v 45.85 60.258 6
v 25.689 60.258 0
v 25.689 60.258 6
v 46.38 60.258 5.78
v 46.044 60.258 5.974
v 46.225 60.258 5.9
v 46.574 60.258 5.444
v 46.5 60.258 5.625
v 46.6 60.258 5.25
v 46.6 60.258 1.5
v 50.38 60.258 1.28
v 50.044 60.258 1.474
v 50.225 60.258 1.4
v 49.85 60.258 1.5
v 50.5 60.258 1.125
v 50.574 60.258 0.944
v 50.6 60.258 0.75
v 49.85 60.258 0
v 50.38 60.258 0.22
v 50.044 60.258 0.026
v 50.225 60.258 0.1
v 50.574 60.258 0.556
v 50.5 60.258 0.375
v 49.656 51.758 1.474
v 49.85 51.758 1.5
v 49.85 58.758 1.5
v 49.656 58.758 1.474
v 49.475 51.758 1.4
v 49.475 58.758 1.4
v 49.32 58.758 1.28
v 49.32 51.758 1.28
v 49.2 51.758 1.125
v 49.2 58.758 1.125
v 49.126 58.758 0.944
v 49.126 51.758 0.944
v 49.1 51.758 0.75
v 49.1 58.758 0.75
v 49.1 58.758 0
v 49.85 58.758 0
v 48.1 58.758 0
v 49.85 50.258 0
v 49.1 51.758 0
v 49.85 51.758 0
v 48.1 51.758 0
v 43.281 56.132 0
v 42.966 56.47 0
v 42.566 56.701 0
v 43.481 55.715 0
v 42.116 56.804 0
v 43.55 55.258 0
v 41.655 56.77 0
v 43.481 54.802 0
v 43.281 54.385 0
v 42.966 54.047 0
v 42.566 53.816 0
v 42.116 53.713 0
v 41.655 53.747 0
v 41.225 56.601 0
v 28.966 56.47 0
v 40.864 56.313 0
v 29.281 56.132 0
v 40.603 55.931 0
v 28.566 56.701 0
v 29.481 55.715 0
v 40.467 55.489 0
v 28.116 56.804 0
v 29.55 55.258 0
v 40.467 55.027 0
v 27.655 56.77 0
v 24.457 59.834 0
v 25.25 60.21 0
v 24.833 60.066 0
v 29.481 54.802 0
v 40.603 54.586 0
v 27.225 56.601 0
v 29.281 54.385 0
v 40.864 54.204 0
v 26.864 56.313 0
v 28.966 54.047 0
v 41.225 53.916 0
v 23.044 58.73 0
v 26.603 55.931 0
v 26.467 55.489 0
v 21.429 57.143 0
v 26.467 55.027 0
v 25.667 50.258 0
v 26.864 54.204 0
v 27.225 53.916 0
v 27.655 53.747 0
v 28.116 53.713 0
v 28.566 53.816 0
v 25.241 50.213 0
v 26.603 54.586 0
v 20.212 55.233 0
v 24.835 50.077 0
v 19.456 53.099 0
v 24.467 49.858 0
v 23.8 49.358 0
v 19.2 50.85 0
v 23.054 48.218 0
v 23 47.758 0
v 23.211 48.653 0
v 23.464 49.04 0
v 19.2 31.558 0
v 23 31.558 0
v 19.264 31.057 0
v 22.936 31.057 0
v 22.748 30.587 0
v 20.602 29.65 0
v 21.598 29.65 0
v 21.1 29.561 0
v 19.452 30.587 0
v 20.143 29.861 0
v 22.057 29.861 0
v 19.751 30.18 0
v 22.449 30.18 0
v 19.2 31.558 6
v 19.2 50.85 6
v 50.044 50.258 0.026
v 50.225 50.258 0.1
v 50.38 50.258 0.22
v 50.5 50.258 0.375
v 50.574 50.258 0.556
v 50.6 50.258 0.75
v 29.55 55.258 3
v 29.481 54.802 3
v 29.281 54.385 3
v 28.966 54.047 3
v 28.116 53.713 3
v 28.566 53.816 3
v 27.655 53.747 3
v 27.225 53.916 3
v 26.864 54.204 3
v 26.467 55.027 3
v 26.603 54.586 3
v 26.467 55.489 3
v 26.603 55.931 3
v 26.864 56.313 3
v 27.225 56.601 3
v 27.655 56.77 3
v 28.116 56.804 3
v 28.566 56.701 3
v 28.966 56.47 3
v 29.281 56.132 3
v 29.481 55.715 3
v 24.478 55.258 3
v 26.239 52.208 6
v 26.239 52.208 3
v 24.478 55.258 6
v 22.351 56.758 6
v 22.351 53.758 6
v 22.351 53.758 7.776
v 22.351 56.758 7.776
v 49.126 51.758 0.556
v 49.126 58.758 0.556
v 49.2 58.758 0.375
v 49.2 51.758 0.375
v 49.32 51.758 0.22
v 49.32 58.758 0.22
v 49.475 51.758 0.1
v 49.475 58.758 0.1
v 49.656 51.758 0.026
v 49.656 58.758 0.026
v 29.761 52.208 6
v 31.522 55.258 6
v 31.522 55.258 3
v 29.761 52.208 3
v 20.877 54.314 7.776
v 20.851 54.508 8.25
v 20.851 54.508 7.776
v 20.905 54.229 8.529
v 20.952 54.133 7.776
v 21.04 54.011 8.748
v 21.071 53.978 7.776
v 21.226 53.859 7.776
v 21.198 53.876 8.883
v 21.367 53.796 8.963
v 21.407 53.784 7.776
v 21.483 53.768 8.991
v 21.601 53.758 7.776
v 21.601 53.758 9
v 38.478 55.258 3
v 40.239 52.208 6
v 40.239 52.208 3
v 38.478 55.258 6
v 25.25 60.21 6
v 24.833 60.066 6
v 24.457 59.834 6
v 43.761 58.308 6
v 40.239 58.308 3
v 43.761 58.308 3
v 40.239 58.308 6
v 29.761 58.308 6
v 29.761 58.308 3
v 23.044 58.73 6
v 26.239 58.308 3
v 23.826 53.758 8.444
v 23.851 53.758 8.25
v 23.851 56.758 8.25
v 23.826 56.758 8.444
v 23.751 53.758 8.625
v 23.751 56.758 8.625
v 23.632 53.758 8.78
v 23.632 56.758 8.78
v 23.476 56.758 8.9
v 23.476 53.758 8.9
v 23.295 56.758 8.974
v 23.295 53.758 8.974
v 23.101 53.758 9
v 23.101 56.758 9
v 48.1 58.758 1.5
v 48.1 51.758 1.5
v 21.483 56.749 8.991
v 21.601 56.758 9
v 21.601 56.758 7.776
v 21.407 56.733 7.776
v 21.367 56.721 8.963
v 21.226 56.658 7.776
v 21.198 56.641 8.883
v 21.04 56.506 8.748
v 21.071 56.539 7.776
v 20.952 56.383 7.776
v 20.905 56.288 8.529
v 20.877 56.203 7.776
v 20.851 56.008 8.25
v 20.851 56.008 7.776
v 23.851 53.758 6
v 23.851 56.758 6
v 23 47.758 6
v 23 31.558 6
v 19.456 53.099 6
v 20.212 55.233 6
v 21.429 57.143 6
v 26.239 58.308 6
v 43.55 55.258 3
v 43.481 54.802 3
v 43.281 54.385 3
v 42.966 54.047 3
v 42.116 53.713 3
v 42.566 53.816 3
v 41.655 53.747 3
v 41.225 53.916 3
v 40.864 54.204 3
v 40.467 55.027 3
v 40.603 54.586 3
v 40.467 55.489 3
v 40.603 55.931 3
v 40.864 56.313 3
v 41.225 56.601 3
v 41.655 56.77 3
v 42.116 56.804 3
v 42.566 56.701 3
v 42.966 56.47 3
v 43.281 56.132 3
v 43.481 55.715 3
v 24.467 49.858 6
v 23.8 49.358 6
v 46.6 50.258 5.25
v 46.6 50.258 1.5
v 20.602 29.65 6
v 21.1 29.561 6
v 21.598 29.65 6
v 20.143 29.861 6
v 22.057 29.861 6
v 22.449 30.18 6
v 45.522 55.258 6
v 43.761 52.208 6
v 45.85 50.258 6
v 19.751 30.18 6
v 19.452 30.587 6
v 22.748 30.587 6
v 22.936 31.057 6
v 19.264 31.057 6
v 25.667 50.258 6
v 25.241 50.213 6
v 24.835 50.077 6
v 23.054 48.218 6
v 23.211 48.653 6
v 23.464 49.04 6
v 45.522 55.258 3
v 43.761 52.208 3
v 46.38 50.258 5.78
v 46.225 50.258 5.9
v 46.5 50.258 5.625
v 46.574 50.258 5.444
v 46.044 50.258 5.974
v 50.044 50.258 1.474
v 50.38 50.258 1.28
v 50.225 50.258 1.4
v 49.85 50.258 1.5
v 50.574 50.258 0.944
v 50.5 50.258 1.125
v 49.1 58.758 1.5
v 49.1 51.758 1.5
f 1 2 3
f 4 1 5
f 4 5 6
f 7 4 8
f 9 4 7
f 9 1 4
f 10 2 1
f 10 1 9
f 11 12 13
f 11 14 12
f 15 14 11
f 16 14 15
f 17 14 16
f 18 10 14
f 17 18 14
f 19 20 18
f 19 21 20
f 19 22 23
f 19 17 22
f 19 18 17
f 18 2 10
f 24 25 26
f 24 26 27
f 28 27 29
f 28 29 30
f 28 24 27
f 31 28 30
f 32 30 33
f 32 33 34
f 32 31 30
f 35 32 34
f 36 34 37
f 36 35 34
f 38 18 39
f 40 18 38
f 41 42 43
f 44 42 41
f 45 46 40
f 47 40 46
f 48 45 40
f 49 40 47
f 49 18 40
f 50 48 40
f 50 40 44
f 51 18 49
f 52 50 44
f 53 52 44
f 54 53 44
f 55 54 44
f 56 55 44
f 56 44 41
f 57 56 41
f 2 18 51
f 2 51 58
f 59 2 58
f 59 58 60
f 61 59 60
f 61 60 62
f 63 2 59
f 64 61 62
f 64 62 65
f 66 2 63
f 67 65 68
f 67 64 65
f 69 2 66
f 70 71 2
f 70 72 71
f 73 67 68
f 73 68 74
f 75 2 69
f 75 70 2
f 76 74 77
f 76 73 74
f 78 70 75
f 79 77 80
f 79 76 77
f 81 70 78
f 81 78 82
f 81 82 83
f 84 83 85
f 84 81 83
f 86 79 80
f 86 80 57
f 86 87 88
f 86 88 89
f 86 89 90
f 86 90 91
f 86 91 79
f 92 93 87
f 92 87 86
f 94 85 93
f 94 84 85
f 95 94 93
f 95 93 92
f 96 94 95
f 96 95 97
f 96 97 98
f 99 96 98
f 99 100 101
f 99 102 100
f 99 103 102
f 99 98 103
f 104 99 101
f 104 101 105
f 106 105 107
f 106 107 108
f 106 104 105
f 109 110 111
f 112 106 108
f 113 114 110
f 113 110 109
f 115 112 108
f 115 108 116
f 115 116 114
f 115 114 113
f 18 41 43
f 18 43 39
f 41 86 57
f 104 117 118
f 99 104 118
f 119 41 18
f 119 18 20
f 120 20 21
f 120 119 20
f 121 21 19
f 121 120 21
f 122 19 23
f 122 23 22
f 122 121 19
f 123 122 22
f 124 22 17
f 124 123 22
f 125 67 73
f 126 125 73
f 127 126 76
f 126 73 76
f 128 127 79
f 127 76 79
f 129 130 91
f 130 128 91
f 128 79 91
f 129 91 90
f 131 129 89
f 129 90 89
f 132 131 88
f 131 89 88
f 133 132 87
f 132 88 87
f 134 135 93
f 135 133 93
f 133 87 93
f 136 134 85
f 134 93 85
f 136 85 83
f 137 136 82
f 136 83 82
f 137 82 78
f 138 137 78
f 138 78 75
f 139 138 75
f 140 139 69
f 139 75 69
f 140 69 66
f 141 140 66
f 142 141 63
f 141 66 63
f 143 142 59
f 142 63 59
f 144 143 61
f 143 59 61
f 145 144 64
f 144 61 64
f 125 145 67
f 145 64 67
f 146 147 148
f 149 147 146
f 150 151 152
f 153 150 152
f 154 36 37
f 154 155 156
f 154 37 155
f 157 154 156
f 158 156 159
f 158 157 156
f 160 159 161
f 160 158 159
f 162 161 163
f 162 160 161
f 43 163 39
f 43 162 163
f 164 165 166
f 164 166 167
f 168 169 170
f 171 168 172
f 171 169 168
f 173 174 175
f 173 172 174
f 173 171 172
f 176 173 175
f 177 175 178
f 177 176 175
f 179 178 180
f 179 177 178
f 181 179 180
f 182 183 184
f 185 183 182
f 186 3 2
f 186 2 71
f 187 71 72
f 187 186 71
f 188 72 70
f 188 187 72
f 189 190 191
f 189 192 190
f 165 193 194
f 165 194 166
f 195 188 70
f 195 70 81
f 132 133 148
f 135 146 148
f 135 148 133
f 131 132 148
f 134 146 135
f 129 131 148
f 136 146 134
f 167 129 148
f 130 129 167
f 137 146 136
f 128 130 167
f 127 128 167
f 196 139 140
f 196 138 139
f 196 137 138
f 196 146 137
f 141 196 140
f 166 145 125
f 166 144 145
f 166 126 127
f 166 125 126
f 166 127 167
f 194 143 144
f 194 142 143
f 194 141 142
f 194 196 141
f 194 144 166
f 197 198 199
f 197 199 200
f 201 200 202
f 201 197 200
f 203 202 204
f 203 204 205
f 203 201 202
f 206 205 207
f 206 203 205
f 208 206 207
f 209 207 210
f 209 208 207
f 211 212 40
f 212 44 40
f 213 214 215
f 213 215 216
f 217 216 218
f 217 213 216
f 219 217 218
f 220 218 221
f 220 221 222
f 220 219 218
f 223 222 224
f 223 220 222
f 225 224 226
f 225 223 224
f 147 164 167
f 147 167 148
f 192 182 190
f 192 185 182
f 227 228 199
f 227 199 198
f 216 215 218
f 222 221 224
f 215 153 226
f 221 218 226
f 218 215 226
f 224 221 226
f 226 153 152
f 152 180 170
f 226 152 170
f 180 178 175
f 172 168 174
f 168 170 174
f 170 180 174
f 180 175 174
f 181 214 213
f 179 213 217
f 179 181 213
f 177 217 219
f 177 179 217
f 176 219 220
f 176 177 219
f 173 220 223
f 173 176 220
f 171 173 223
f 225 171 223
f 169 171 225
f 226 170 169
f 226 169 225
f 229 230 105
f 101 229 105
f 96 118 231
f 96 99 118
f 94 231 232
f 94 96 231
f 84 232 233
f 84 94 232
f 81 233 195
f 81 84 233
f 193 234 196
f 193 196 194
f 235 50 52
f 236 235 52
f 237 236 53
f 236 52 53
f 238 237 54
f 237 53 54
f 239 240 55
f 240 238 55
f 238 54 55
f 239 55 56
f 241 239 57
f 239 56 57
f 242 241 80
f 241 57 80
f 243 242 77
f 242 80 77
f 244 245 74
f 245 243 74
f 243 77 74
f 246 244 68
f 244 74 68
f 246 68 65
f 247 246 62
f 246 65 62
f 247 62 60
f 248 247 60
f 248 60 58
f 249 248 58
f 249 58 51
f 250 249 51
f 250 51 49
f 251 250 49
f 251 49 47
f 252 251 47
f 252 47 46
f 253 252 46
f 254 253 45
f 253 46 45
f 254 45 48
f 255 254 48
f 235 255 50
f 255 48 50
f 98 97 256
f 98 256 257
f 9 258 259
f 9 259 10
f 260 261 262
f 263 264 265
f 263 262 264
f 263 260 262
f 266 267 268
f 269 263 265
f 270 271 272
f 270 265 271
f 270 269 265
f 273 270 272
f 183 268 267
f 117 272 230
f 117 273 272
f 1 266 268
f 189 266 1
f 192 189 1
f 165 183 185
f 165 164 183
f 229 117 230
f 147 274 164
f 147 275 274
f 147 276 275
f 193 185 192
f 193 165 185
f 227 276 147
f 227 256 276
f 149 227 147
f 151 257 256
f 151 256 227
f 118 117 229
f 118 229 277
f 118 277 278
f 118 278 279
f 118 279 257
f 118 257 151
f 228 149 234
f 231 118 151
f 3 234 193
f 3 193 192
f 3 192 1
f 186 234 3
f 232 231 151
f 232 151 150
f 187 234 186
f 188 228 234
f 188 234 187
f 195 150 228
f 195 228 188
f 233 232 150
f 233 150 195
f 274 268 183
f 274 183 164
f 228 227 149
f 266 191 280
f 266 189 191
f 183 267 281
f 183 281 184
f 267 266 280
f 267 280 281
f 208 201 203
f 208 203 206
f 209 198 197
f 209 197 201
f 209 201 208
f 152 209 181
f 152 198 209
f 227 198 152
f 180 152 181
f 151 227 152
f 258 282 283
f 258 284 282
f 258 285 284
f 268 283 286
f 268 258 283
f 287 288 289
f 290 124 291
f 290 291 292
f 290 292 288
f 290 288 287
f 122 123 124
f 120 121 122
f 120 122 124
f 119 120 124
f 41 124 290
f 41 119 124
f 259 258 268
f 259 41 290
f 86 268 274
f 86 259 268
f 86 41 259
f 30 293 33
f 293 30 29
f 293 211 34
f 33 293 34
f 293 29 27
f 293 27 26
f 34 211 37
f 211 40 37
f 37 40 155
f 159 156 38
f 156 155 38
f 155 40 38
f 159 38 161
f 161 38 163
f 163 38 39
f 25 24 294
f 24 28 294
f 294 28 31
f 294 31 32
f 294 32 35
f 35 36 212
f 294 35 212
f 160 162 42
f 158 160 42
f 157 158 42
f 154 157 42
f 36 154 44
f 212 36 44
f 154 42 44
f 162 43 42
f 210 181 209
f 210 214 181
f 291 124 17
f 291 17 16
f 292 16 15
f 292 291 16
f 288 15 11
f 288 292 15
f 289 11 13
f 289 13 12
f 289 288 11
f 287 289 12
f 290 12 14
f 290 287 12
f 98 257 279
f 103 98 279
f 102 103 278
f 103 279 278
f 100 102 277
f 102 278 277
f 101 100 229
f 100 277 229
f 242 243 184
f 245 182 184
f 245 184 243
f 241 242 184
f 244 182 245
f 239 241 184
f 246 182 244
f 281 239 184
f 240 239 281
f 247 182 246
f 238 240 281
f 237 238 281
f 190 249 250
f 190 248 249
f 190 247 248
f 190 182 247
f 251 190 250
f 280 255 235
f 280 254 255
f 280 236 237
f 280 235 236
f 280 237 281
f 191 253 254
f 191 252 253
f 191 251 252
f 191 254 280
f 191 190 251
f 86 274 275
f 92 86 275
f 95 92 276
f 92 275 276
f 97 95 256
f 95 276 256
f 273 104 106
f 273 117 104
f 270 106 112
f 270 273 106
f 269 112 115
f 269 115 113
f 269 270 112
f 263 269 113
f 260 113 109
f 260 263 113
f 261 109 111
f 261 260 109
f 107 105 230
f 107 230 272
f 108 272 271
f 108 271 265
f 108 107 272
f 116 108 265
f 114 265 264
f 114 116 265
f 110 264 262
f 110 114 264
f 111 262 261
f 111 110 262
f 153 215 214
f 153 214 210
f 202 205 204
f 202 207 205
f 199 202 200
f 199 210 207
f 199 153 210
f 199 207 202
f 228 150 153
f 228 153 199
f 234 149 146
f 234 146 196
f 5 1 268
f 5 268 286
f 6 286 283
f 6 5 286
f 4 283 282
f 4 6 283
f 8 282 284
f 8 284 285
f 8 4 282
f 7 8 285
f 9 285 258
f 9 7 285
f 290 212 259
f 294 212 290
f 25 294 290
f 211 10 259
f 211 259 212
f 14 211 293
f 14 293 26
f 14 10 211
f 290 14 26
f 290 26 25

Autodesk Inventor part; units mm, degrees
ref_plane "YZ Plane" through (0, 0, 0) normal (1, 0, 0) x (0, 1, 0)
ref_plane "XZ Plane" through (0, 0, 0) normal (0, 1, 0) x (-1, 0, 0)
ref_plane "Work Plane1" through (0, 0, 0) normal (0, 0, 1) x (1, 0, 0)
sketch "mount_sketch" plane through (0, 0, 0) normal (0, 0, 1) x (1, 0, 0)
  circle A0 centre (42, 55.2584) radius 1.55 projected
  circle A1 centre (28, 55.2584) radius 1.55 projected
  line L0 (45, 60.2584) -> (25, 60.2584)
  line L1 (25, 60.2584) -> (15.4, 52.7584)
  line L2 (15.4, 52.7584) -> (15.4, 29.5584)
  line L3 (15.4, 29.5584) -> (19.4, 29.5584)
  line L4 (19.4, 29.5584) -> (19.4, 48.7584)
  line L5 (19.4, 48.7584) -> (23, 48.7584)
  circle A2 centre (42, -54.7416) radius 1.55 construction
  circle A3 centre (28, -54.7416) radius 1.55 construction
  line L6 (47, -54.627) -> (47, 66.2497) construction
  circle A4 centre (12, 51.2584) radius 1.55 construction
  circle A5 centre (12, -37.8416) radius 1.55 construction
  circle A6 centre (12, -54.7416) radius 1.55 construction
  circle A7 centre (29, -68.7416) radius 1.55 construction
  circle A8 centre (14, -68.7416) radius 1.55 construction
  line L7 (45, 50.2584) -> (25, 50.2584)
  line L8 (25, 50.2584) -> (23, 48.7584)
  line L9 (45, 60.2584) -> (46.5, 60.2584)
  line L10 (46.5, 60.2584) -> (46.5, 50.2584)
  line L11 (46.5, 50.2584) -> (45, 50.2584)
  line L12 (23, 48.7584) -> (23, 58.6959)
  line L13 (35, 55.2584) -> (35, 60.2584)
  line L14 (35, 55.2584) -> (35, 50.2584)
  line L15 (46.5, 60.2584) -> (46.6, 60.2584)
  line L16 (46.6, 60.2584) -> (46.6, 50.2584)
  line L17 (46.6, 50.2584) -> (46.5, 50.2584)
  line L18 (46.6, 60.2584) -> (50.6, 60.2584)
  line L19 (50.6, 60.2584) -> (50.6, 50.2584)
  line L20 (50.6, 50.2584) -> (46.6, 50.2584)
  line L21 (46.6, 50.2584) -> (46.6, 60.2584)
  line L22 (48.1, 58.7584) -> (49.1, 58.7584)
  line L23 (49.1, 58.7584) -> (49.1, 51.7584)
  line L24 (49.1, 51.7584) -> (48.1, 51.7584)
  line L25 (48.1, 51.7584) -> (48.1, 58.7584)
  point P0 (0, 0)
  dimension "d1" = 110
  dimension "d2" = 6.5
  dimension "d3" = 27.6
  dimension "d4" = 4
  dimension "d5" = 14
  dimension "d6" = 5
  dimension "d7" = 19.2
  dimension "d9" = 3.4
  dimension "d13" = 3
  dimension "d30" = 2
  dimension "d32" = 5
  dimension "d62" = 4.5
  dimension "d77" = 4.6
  dimension "d128" = 4
  dimension "d129" = 1.5
  dimension "d130" = 1.5
  dimension "d132" = 7
  dimension "d133" = 1.5
extrude "mount" add sketch "mount_sketch" along normal blind 6
fillet "common" radius 2 2 edges at (25, 60.2584, 3) (25, 50.2584, 3)
sketch "nuts_sketch" plane through (0, 0, 6) normal (0, 0, 1) x (1, 0, 0)
  circle A0 centre (42, 55.2584) radius 1.55 projected
  circle A1 centre (28, 55.2584) radius 1.55 projected
  line L0 (38.4782, 55.2584) -> (40.2391, 58.3084)
  line L1 (40.2391, 58.3084) -> (43.7609, 58.3084)
  line L2 (43.7609, 58.3084) -> (45.5218, 55.2584)
  line L3 (45.5218, 55.2584) -> (43.7609, 52.2084)
  line L4 (43.7609, 52.2084) -> (40.2391, 52.2084)
  line L5 (40.2391, 52.2084) -> (38.4782, 55.2584)
  line L6 (31.5218, 55.2584) -> (29.7609, 52.2084)
  line L7 (29.7609, 52.2084) -> (26.2391, 52.2084)
  line L8 (26.2391, 52.2084) -> (24.4782, 55.2584)
  line L9 (24.4782, 55.2584) -> (26.2391, 58.3084)
  line L10 (26.2391, 58.3084) -> (29.7609, 58.3084)
  line L11 (29.7609, 58.3084) -> (31.5218, 55.2584)
  point P0 (0, 0)
  dimension "d26" = 6.1
  dimension "d27" = 6.1
extrude "nuts" cut sketch "nuts_sketch" against normal blind 3
sketch "Sketch20" plane through (19.4, 29.5584, 0) normal (1, 0, 0) x (0, 0, -1)
  line L0 (-6, 0) -> (-6, 19.2) projected
  line L1 (-6, 0) -> (-6, 19.2)
  line L2 (0, 19.2) -> (-6, 19.2) projected
  line L3 (-6, 19.2) -> (0, 19.2)
  line L4 (0, 0) -> (-6, 0) projected
  line L5 (0, 19.2) -> (0, 0)
  line L6 (0, 0) -> (-6, 0)
  point P0 (0, -29.5584)
extrude "Extrusion15" add sketch "Sketch20" along normal blind 3.6
sketch "Sketch21" plane through (0, 0, 6) normal (0, 0, 1) x (1, 0, 0)
  line L0 (15.4, 29.5584) -> (23, 29.5584) projected
  line L1 (19.2, 29.5584) -> (19.2, 55.7272)
  line L2 (24.4573, 59.8345) -> (15.4, 52.7584) projected
  line L3 (15.4, 52.7584) -> (15.4, 29.5584) projected
  line L4 (19.2, 29.5584) -> (15.4, 29.5584)
  line L5 (15.4, 29.5584) -> (15.4, 52.7584)
  line L6 (15.4, 52.7584) -> (19.2, 55.7272)
  line L7 (23, 48.7584) -> (24.4667, 49.8584) projected
  line L8 (23, 48.7584) -> (19.2, 48.7584)
  line L9 (23, 48.7584) -> (23, 29.5584) projected
  line L10 (23, 48.7584) -> (23, 58.6959)
  line L11 (19.2, 48.7584) -> (23, 58.6959)
  point P0 (0, 0)
extrude "Extrusion16" cut sketch "Sketch21" against normal blind 6 contours L3 L2 L1 L0
sketch "Sketch22" plane through (0, 0, 6) normal (0, 0, 1) x (1, 0, 0)
  line L0 (23, 48.7584) -> (23, 29.5584) projected
  line L1 (23, 48.7584) -> (23, 58.6959)
  line L2 (24.4573, 59.8345) -> (19.2, 55.7272) projected
  line L3 (23, 48.7584) -> (19.2, 48.7584)
  line L4 (19.2, 29.5584) -> (19.2, 55.7272) projected
  point P0 (0, 0)
fillet "Fillet12" radius 10 1 edges at (19.2, 55.7272, 3)
fillet "Fillet13" radius 2 1 edges at (23, 48.7584, 3)
fillet "Fillet14" radius 2 2 edges at (23, 29.5584, 3) (19.2, 29.5584, 3)
sketch "Sketch28" plane through (0, 0, 6) normal (0, 0, 1) x (1, 0, 0)
  line L0 (24.4782, 55.2584) -> (26.2391, 58.3084) projected
  line L1 (26.2391, 58.3084) -> (29.7609, 58.3084) projected
  line L2 (29.7609, 58.3084) -> (31.5218, 55.2584) projected
  line L3 (31.5218, 55.2584) -> (29.7609, 52.2084) projected
  line L4 (29.7609, 52.2084) -> (26.2391, 52.2084) projected
  line L5 (26.2391, 52.2084) -> (24.4782, 55.2584) projected
  arc A0 (25.6886, 60.2584) -> (24.4573, 59.8345) centre (25.6886, 58.2584) ccw projected
  line L6 (24.4573, 59.8345) -> (23.0436, 58.73) projected
  arc A1 (23.0436, 58.73) -> (19.2, 50.8497) centre (29.2, 50.8497) ccw projected
  line L7 (19.2, 50.8497) -> (19.2, 31.5484) projected
  arc A2 (19.2, 31.5484) -> (21, 29.5584) centre (21.2, 31.5484) ccw projected
  arc A3 (21, 29.5584) -> (23, 31.5584) centre (21, 31.5584) ccw projected
  line L8 (23, 47.7584) -> (23, 31.5584) projected
  arc A4 (23.8, 49.3584) -> (23, 47.7584) centre (25, 47.7584) ccw projected
  line L9 (23.8, 49.3584) -> (24.4667, 49.8584) projected
  arc A5 (25.6667, 50.2584) -> (24.4667, 49.8584) centre (25.6667, 48.2584) ccw projected
  line L10 (45.5218, 55.2584) -> (43.7609, 52.2084) projected
  line L11 (43.7609, 52.2084) -> (40.2391, 52.2084) projected
  line L12 (40.2391, 52.2084) -> (38.4782, 55.2584) projected
  line L13 (38.4782, 55.2584) -> (40.2391, 58.3084) projected
  line L14 (40.2391, 58.3084) -> (43.7609, 58.3084) projected
  line L15 (43.7609, 58.3084) -> (45.5218, 55.2584) projected
  line L16 (29.7609, 52.2084) -> (26.2391, 52.2084) projected
  line L17 (26.2391, 52.2084) -> (19.2927, 52.2084)
  line L18 (24.4782, 55.2584) -> (22.3512, 55.2584)
  line L19 (22.3512, 55.2584) -> (22.3512, 52.823)
  line L20 (22.3512, 55.2584) -> (20.2243, 55.2584)
  line L21 (22.3512, 55.2584) -> (22.3512, 57.0751)
  line L22 (20.8512, 56.7584) -> (22.3512, 56.7584)
  line L23 (23.8512, 56.7584) -> (23.8512, 53.7584)
  line L24 (23.8512, 53.7584) -> (20.8512, 53.7584)
  line L25 (20.8512, 53.7584) -> (20.8512, 55.2584)
  line L26 (20.8512, 55.2584) -> (20.8512, 56.7584)
  line L27 (22.3512, 56.7584) -> (23.8512, 56.7584)
  line L28 (25.6667, 50.2584) -> (50.6, 50.2584) projected
  line L29 (50.6, 50.2584) -> (50.6, 60.2584) projected
  line L30 (50.6, 60.2584) -> (25.6886, 60.2584) projected
  point P0 (0, 0)
  dimension "d121" = 3
  dimension "d122" = 3
extrude "hook" add sketch "Sketch28" along normal blind 3 contours L23 L24 L19 L18 | L18 L21 L27 L23 | L19 L24 L25 L20 | L20 L26 A1 L22 L21 | L26 L22 A1
sketch "Sketch29" plane through (20.8512, 53.7584, 6) normal (0, -1, 0) x (1, 0, 0)
  line L0 (3, 0) -> (0, 0) projected
  line L1 (3, 0) -> (3, 3) projected
  line L2 (0, 3) -> (3, 3) projected
  line L3 (0, 0) -> (0, 3) projected
  line L4 (0, 0) -> (1.5, 0)
  line L5 (1.5, 0) -> (1.5, 1.7757)
  line L6 (1.5, 1.7757) -> (0, 1.7757)
  line L7 (0, 1.7757) -> (0, 0)
  line L8 (1.5, 1.7757) -> (3, 1.7757)
  line L9 (0, 0) -> (0, 3) projected
  line L10 (0, 1.7757) -> (0, 3)
  point P0 (-20.8512, -6)
extrude "hook_cutout" cut sketch "Sketch29" against normal through all contours L0 L3 L6 L5
sketch "Sketch33" plane through (0, 0, 6) normal (0, 0, 1) x (1, 0, 0)
  line L0 (49.1, 58.7584) -> (49.1, 51.7584) projected
  line L1 (49.1, 51.7584) -> (48.1, 51.7584) projected
  line L2 (48.1, 51.7584) -> (48.1, 58.7584) projected
  line L3 (48.1, 58.7584) -> (49.1, 58.7584) projected
  line L4 (25.6667, 50.2584) -> (50.6, 50.2584) projected
  line L5 (50.6, 60.2584) -> (25.6886, 60.2584) projected
  line L6 (50.6, 50.2584) -> (46.6, 50.2584)
  line L7 (46.6, 50.2584) -> (46.6, 60.2584)
  line L8 (46.6, 60.2584) -> (50.6, 60.2584)
  line L9 (50.6, 60.2584) -> (50.6, 50.2584)
  point P0 (0, 0)
  dimension "d141" = 4
extrude "Extrusion25" cut sketch "Sketch33" against normal blind 4.5
fillet "Fillet21" radius 0.75 9 edges at (49.1, 55.2584, 1.5) (50.6, 55.2584, 1.5) (49.1, 55.2584, 0) (50.6, 55.2584, 0) (46.6, 55.2584, 6) (20.8512, 55.2584, 9) (23.8512, 55.2584, 9) (20.8512, 56.7584, 8.3879) (20.8512, 53.7584, 8.3879)
equation "\"d27\" = d26"
equation "\"hook_width\" = 1.5"
equation "\"hook_height\" = 7"
properties part number "mount_battery" material "ABS Plastic"
